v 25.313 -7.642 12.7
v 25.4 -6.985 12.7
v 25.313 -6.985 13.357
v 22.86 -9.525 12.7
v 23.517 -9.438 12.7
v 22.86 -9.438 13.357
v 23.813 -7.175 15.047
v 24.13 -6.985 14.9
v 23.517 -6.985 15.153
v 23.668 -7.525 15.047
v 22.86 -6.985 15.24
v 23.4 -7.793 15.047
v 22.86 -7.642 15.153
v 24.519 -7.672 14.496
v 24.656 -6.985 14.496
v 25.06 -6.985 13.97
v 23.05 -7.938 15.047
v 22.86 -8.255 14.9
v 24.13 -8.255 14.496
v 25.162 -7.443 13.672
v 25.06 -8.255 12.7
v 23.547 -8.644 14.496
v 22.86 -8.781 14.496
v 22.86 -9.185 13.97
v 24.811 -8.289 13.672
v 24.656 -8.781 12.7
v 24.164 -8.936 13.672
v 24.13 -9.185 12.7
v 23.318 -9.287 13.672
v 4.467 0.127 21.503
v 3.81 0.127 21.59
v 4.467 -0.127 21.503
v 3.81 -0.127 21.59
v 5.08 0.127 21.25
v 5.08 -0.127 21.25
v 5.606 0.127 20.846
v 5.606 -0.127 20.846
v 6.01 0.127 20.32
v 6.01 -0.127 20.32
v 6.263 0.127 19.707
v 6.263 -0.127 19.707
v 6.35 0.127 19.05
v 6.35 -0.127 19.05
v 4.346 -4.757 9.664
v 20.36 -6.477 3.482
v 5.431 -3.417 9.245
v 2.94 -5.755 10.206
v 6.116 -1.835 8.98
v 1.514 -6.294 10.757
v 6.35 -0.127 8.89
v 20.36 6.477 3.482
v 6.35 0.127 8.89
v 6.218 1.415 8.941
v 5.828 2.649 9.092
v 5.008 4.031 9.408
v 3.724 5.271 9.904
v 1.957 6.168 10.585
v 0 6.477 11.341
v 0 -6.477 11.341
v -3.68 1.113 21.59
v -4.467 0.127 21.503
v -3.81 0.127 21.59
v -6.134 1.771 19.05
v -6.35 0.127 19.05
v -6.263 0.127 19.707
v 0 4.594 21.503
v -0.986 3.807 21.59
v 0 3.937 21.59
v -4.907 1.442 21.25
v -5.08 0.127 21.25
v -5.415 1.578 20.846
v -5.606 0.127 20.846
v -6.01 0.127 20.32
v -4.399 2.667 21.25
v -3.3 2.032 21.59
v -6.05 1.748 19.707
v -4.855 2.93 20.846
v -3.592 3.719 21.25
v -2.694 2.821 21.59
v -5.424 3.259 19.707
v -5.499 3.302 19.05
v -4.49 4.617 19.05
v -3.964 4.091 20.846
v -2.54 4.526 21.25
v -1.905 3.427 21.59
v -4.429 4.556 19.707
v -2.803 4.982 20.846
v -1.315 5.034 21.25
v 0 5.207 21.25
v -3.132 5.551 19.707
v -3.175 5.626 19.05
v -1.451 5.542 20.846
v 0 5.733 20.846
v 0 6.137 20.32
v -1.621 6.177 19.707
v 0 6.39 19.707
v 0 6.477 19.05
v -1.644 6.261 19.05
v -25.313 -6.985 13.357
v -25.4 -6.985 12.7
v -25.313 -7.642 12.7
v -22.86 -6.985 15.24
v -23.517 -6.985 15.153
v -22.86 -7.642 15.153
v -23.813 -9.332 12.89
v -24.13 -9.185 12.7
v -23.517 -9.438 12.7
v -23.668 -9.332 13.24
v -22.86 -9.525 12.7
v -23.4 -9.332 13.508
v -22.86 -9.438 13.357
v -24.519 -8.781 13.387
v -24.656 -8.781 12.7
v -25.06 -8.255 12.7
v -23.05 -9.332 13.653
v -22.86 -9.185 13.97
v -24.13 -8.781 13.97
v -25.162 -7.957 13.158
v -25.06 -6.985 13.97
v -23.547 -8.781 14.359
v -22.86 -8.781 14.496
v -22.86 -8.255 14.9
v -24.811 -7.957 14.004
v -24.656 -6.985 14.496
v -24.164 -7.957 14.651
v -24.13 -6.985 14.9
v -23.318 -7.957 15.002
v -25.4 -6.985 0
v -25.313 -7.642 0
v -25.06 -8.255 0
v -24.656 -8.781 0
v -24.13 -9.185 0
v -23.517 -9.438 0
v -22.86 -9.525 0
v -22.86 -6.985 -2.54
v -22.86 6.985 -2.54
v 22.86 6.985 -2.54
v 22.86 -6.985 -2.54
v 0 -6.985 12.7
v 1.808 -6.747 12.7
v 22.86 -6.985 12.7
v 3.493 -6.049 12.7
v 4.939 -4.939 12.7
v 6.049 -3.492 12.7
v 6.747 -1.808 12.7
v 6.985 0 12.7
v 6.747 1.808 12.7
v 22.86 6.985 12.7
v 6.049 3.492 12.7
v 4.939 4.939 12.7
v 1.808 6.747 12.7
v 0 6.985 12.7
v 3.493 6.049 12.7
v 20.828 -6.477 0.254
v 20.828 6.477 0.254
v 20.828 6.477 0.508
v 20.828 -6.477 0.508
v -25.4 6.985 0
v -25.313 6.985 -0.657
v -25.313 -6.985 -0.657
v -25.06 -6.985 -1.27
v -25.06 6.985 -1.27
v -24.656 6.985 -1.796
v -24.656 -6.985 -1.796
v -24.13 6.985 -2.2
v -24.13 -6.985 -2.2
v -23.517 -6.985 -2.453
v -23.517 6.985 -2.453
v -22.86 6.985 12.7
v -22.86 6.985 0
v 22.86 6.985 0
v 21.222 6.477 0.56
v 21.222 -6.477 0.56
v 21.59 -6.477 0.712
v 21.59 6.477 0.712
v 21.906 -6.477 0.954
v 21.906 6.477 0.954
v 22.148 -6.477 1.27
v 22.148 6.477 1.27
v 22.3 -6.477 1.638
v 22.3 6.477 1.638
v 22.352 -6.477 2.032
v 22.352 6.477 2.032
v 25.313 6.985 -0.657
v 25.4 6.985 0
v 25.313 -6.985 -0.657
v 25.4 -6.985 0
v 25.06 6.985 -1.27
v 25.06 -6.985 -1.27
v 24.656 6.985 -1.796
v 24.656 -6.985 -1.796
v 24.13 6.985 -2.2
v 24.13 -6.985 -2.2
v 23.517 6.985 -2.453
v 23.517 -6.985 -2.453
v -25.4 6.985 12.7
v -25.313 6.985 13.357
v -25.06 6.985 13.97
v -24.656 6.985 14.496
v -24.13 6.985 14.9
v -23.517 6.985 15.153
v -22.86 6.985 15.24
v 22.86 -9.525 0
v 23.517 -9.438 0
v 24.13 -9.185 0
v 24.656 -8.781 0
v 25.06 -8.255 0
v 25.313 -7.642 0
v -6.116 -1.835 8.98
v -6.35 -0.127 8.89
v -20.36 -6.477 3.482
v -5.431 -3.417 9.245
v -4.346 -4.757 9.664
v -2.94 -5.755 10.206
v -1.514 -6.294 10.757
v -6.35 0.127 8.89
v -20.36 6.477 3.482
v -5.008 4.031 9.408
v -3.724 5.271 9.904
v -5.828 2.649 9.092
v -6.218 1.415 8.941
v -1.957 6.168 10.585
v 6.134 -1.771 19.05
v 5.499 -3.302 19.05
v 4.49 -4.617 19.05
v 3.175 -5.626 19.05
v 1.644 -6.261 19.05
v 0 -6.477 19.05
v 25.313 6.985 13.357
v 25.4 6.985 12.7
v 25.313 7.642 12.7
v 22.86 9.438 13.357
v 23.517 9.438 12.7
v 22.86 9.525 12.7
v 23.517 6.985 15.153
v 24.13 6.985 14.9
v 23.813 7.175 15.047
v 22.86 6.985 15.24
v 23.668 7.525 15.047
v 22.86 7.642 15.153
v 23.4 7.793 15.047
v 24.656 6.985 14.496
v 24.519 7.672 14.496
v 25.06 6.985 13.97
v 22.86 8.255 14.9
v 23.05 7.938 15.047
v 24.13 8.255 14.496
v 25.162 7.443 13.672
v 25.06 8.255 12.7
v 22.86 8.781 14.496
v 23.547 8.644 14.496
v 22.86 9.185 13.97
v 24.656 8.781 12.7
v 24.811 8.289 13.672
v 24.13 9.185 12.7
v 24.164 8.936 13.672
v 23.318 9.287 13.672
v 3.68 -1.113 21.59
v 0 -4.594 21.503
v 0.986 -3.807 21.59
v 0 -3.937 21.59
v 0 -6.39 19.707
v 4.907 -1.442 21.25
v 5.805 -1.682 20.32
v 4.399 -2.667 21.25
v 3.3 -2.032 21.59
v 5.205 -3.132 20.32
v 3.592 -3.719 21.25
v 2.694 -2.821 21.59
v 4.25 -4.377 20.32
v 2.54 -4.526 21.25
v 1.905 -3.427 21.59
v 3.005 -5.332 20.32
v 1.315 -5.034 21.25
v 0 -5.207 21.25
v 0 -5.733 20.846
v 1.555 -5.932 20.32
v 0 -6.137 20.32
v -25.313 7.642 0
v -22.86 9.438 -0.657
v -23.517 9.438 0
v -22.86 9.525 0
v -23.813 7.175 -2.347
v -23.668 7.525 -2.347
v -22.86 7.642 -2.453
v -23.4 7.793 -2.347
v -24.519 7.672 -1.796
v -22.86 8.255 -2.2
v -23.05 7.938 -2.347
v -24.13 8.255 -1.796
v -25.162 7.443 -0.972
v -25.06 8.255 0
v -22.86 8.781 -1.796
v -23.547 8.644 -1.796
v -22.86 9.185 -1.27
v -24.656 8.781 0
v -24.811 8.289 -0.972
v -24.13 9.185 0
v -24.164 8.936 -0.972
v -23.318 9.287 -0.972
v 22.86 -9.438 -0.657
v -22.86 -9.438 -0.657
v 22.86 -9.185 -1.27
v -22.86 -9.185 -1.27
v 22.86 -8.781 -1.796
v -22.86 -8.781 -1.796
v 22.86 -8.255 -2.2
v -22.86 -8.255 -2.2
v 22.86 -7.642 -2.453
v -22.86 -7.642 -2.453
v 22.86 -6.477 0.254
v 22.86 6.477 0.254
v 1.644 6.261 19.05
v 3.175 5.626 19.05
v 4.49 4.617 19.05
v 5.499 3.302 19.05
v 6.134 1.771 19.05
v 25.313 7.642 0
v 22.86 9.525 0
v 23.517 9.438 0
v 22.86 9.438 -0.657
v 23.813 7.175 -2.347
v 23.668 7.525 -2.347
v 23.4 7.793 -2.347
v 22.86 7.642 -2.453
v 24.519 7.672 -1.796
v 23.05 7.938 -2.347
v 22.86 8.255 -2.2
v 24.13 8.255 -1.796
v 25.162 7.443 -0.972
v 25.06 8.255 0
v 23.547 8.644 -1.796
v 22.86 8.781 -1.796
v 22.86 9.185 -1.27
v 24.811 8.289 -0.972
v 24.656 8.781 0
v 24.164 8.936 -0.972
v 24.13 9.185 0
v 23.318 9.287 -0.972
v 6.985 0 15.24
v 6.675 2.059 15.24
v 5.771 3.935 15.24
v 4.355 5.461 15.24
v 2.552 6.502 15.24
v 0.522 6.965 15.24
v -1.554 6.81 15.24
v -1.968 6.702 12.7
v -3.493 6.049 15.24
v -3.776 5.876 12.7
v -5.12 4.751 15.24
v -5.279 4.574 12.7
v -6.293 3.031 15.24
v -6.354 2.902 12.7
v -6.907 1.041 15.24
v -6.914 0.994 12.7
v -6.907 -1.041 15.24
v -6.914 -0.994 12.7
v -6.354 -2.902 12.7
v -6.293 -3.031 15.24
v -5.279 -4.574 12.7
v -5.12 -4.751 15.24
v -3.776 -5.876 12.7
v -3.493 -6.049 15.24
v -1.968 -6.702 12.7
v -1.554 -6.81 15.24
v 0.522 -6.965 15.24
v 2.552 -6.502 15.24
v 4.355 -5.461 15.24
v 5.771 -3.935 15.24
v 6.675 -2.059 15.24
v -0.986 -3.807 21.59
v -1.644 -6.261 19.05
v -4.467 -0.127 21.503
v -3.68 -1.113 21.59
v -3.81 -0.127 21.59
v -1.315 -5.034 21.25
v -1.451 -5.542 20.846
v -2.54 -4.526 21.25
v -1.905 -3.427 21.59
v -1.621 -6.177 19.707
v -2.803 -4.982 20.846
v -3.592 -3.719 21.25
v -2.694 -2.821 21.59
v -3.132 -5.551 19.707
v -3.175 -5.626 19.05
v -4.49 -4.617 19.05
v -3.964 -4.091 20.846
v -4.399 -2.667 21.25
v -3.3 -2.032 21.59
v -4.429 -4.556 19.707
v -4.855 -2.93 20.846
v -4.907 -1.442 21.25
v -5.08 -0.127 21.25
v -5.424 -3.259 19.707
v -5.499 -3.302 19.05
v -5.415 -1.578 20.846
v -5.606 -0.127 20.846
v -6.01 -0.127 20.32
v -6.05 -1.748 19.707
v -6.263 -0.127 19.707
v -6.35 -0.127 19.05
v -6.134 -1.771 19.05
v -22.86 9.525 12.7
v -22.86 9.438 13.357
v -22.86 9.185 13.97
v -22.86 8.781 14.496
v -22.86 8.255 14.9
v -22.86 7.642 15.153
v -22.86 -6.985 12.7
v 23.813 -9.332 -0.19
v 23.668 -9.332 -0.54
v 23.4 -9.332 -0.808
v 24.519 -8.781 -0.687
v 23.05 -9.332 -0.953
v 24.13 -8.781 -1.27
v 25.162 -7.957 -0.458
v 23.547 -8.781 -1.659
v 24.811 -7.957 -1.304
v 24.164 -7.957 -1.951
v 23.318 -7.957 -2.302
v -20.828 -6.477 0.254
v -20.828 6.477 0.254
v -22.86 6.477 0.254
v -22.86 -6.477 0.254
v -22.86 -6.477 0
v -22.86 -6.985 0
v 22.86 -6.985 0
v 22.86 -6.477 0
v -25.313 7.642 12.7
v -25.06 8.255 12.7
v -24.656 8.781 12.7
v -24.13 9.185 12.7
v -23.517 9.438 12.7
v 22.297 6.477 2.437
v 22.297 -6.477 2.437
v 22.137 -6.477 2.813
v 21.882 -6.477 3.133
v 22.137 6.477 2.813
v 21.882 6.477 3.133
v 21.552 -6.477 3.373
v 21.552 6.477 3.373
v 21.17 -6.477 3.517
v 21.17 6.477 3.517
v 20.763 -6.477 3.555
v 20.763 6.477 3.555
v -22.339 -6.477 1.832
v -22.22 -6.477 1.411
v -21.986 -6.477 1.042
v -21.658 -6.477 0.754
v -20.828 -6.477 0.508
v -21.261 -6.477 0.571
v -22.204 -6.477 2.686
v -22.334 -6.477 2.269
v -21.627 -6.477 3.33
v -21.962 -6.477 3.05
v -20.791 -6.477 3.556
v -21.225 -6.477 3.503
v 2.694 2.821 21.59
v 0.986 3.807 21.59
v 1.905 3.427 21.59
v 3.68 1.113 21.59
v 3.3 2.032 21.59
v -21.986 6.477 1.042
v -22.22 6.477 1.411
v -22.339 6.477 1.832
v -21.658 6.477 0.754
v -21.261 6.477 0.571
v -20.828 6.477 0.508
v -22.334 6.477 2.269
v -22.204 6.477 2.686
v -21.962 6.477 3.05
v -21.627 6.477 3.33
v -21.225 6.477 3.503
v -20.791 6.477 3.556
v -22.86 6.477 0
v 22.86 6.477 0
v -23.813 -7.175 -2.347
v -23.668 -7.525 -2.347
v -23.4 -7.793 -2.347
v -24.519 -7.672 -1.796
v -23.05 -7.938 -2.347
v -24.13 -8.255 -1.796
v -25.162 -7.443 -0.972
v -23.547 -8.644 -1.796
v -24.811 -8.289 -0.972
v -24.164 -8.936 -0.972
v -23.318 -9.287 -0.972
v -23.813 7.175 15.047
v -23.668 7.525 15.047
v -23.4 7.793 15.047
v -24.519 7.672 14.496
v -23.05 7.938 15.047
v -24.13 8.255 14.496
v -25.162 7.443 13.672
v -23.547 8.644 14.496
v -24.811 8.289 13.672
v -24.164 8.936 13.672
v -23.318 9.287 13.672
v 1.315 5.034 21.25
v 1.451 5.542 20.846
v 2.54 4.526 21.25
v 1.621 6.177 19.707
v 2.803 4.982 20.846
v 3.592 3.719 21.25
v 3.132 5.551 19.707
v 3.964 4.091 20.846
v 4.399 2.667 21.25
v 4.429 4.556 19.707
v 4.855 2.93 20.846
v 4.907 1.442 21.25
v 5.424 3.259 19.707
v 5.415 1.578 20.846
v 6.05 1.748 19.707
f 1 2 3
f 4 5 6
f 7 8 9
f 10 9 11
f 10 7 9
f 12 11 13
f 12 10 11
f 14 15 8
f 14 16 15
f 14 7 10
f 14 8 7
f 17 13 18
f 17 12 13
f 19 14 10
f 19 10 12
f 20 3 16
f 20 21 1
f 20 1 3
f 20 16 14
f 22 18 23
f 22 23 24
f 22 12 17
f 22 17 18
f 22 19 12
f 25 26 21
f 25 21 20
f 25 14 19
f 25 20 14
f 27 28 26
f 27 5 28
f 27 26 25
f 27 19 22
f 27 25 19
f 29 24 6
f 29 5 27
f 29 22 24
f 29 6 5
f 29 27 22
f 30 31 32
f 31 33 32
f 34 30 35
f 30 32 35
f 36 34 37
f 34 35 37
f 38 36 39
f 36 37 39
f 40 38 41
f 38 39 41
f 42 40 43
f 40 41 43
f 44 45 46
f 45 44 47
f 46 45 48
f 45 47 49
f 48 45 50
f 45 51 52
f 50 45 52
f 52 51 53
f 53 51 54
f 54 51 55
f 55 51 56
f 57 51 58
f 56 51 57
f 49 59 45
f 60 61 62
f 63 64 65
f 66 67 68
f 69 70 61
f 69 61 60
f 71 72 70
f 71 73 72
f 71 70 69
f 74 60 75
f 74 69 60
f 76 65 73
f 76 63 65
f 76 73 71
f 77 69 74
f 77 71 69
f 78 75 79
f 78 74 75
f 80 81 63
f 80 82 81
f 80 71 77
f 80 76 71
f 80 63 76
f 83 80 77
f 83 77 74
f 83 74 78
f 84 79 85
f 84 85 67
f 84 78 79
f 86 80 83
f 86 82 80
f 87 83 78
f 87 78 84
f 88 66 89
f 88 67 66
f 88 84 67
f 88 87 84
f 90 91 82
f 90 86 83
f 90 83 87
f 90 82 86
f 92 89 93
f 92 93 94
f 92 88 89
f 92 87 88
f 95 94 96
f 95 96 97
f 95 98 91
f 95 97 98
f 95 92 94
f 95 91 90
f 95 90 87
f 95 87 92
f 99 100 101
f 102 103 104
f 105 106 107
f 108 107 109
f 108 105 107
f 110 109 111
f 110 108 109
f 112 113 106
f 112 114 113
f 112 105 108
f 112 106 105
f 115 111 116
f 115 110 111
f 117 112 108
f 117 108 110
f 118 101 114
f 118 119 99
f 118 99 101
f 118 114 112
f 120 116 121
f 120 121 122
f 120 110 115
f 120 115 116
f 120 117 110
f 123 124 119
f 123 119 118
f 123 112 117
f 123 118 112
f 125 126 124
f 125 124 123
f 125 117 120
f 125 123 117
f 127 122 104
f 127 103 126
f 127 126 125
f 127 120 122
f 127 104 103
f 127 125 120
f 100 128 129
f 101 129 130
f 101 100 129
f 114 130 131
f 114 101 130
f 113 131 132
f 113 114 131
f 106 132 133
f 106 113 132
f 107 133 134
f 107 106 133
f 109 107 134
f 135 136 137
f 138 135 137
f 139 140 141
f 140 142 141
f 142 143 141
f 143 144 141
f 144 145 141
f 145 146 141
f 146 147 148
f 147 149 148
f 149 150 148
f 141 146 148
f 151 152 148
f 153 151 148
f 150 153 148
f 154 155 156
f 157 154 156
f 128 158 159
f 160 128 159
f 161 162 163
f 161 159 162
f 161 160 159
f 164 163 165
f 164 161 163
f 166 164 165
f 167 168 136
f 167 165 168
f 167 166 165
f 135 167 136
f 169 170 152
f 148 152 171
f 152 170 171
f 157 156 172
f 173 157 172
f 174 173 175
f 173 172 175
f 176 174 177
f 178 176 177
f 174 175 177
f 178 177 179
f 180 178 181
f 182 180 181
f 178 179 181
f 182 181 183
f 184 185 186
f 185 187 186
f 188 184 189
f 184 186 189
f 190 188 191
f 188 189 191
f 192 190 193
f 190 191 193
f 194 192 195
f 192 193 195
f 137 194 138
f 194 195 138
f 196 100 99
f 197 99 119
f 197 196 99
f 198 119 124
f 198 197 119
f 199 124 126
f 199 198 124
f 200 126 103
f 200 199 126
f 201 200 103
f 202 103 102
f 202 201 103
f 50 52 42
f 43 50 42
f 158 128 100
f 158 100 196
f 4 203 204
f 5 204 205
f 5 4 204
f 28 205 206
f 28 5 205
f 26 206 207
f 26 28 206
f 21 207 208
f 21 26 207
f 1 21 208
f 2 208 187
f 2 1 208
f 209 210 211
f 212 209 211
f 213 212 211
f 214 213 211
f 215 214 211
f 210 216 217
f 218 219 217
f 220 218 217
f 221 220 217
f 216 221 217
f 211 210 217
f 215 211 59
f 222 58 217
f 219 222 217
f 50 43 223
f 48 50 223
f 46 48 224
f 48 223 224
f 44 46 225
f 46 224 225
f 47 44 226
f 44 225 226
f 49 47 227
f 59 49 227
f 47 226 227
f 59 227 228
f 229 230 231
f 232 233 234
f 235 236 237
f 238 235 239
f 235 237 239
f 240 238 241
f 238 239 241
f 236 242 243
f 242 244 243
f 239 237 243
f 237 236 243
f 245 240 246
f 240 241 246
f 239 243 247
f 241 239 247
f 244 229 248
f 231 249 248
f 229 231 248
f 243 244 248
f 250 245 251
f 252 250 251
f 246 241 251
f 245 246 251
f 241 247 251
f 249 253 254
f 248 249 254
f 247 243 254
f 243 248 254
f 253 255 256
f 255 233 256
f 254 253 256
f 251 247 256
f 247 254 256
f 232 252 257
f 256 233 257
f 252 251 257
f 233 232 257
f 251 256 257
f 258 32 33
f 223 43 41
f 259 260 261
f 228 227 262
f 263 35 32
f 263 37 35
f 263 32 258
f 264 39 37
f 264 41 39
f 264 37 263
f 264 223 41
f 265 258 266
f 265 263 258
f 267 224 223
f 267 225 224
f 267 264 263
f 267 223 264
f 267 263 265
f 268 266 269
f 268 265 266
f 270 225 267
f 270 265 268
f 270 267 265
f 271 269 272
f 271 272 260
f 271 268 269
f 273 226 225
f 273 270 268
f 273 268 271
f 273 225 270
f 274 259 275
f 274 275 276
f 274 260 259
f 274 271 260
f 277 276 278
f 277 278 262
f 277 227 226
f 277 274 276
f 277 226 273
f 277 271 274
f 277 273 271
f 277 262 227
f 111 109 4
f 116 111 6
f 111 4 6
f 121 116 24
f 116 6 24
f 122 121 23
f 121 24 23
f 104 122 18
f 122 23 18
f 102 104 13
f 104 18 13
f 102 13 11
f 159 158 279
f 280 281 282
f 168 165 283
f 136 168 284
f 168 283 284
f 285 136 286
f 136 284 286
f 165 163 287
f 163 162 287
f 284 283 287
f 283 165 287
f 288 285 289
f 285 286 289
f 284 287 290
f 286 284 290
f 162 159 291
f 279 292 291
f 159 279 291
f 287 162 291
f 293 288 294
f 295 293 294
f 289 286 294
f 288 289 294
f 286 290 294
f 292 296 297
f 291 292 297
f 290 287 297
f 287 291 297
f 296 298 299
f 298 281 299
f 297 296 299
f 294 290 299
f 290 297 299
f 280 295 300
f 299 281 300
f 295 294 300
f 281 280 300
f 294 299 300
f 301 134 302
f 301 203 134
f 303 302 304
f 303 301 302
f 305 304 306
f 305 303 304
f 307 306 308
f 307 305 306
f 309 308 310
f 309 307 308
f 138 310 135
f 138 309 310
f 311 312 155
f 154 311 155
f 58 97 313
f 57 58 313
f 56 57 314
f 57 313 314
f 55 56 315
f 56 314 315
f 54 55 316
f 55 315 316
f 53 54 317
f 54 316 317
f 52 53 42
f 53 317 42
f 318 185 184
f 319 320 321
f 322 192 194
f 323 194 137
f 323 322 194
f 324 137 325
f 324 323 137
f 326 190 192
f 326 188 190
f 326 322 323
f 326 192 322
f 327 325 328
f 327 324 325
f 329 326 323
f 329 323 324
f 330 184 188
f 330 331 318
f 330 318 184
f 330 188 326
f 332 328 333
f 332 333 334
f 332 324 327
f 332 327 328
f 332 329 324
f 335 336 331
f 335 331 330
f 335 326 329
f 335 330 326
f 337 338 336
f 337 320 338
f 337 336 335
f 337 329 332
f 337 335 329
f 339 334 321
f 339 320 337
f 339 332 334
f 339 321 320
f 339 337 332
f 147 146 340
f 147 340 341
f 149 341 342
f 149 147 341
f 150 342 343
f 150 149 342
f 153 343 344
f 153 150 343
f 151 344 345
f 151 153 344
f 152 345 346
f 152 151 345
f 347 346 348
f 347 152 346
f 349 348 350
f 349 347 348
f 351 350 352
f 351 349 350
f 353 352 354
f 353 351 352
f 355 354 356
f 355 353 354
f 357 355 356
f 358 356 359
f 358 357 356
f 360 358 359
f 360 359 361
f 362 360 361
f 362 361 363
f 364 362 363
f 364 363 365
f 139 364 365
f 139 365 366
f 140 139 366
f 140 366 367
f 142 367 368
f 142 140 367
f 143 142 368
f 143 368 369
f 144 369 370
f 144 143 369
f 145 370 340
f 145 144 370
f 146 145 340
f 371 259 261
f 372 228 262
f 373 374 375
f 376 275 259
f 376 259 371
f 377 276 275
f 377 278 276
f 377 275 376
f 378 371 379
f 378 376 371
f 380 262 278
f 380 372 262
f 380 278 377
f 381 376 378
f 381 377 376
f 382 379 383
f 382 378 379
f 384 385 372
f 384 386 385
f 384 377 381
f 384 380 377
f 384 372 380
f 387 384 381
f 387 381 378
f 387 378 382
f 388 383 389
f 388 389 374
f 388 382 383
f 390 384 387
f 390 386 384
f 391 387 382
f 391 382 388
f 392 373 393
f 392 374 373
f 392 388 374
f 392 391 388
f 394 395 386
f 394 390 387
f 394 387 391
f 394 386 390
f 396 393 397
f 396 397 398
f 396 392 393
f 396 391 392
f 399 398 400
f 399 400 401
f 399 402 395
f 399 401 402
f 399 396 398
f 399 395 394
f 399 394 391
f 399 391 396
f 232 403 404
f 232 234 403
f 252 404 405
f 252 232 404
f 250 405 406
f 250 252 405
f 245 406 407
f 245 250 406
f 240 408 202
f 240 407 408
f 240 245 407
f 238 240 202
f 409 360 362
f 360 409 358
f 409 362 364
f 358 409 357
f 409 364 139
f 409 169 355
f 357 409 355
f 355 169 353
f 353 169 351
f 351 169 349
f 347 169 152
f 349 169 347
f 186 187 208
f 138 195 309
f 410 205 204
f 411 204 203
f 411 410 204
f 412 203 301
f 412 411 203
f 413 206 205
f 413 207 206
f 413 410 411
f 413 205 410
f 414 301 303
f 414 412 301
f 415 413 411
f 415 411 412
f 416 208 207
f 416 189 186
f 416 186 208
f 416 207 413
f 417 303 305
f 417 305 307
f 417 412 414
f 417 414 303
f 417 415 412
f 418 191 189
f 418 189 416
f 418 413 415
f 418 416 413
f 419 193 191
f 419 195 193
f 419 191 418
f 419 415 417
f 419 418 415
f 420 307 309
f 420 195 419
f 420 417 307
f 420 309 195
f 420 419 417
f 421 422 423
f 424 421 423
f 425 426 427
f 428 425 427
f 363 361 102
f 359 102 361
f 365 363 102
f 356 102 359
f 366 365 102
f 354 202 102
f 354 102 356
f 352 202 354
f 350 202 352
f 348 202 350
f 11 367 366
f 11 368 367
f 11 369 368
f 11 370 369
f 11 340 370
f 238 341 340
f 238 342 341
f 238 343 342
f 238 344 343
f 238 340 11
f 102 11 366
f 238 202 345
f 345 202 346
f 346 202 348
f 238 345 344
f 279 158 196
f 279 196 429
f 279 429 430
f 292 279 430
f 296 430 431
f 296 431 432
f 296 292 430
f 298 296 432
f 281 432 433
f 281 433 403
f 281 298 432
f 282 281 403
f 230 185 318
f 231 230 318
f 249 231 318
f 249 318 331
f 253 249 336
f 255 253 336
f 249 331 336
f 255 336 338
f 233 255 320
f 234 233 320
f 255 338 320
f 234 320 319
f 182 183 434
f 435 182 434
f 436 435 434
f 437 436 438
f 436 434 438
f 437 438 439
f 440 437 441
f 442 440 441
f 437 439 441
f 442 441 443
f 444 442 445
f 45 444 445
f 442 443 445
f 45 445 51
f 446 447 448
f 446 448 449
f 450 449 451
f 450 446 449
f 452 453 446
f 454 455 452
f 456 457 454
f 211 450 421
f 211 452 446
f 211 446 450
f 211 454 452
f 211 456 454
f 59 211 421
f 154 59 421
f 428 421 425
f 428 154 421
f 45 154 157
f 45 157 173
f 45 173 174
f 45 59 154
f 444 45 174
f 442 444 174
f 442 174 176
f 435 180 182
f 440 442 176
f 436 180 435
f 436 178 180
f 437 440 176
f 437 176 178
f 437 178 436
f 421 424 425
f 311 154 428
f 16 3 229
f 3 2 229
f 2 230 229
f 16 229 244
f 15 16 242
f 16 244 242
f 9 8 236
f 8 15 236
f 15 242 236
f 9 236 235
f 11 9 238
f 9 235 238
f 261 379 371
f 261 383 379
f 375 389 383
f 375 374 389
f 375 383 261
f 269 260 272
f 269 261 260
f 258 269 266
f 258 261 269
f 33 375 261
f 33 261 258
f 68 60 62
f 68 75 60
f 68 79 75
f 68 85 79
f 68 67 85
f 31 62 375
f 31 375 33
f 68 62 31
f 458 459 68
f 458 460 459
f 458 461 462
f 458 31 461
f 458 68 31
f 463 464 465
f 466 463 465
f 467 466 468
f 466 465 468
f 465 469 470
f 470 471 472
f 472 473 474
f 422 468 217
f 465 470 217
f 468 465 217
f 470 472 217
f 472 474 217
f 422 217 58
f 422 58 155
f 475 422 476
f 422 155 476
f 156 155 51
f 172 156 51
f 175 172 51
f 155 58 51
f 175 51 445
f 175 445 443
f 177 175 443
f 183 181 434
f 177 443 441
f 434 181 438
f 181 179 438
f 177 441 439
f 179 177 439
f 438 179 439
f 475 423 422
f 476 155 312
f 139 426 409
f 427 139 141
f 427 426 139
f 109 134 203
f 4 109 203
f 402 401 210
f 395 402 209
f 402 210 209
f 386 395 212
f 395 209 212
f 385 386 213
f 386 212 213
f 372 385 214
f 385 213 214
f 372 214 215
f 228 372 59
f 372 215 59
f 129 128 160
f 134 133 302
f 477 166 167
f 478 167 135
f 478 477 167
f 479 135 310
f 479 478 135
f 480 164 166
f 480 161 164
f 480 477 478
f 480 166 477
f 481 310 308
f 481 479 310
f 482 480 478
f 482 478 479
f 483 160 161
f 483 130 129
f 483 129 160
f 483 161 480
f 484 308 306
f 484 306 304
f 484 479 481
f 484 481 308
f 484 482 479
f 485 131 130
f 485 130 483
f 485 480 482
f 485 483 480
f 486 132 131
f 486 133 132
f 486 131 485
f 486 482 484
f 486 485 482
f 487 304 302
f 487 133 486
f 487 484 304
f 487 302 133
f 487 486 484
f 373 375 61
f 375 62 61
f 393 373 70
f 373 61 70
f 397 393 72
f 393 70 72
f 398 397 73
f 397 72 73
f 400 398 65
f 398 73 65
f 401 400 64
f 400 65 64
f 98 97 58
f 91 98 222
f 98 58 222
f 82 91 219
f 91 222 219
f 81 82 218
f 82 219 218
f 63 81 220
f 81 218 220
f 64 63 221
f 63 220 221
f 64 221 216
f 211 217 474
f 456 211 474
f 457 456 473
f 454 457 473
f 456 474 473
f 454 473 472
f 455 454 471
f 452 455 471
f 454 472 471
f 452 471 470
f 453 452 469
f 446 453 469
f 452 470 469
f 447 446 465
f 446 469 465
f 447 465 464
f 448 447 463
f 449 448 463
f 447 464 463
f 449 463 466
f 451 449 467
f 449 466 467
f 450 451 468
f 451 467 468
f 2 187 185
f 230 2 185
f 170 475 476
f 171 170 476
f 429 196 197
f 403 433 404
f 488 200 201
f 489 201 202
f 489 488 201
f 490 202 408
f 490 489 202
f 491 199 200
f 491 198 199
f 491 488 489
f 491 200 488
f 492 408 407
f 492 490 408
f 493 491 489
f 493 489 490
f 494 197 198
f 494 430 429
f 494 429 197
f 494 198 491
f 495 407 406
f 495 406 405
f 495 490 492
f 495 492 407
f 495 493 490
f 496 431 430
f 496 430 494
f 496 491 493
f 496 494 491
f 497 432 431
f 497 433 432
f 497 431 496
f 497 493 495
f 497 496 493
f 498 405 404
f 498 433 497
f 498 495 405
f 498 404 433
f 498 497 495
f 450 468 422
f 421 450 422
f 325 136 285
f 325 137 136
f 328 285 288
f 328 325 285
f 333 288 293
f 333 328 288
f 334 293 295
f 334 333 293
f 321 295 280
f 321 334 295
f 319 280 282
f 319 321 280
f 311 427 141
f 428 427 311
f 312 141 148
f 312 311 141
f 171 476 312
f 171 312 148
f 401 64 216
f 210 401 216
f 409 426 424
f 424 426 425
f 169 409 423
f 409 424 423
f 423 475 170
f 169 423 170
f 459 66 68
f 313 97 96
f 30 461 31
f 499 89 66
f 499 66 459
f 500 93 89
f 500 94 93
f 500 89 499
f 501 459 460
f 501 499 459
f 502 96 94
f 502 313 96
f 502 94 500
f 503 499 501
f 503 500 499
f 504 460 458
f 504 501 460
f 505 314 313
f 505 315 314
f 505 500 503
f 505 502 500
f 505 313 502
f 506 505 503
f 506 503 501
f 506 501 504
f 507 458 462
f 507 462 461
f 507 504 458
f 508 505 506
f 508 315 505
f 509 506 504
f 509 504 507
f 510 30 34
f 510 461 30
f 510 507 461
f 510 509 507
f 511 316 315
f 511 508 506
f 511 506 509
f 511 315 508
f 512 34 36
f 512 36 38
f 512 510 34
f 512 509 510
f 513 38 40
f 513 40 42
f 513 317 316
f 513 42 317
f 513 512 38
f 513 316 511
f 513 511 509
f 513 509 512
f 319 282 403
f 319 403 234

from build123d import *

# Parameters (mm, degrees)
F0_W     = 50.8
F0_H     = 19.05
F0_W_2   = 45.72
F0_H_2   = 13.97
F1_DEPTH = 12.7
F2_W     = 50.8
F2_H     = 19.05
F3_DEPTH = 2.54
F5_START = 0.508
F4_W     = 4.572
F4_H     = 2.794
F4_W_2   = 12.7
F4_H_2   = 5.08
F4_H_3   = 3.81
F5_DEPTH = 12.954
F6_R     = 6.34999
F7_W     = 50.8
F7_H     = 19.05
F7_R     = 6.985
F8_DEPTH = 2.54
F9_R     = 2.54
F10_R    = 2.54


# Not quite as in the source:
# - a fillet or chamfer is up to 0.001 mm smaller than in the source, because OpenCascade refuses the exact size


with BuildPart() as f1:
    # F0 (on Top) → F1 (new body)
    with BuildSketch(Plane.XY):
        Rectangle(F0_W, F0_H)
        Rectangle(F0_W_2, F0_H_2, mode=Mode.SUBTRACT)
    extrude(amount=F1_DEPTH)

    # F2 (on face) → F3 (join)
    with BuildSketch(Plane(origin=(0, 0, 0), x_dir=(1, 0, 0), z_dir=(0, 0, -1))):
        Rectangle(F2_W, F2_H)
    extrude(amount=F3_DEPTH)

    # F4 (on face) → F5 (join)
    with BuildSketch(Plane.XZ.offset(-6.985).offset(F5_START)):
        Polygon((-25.4, 0.254), (-25.4, -2.54), (20.828, -2.54), (20.828, 0.254), (-20.828, 0.254), align=None)
        with Locations((23.114, -1.143)):
            Rectangle(F4_W, F4_H)
        with BuildLine():
            Line((-20.828, 0.254), (20.828, 0.254))
            Line((20.828, 0.254), (20.828, 0.508))
            ThreePointArc((20.828, 0.508), (19.7166563034, 0.9891715443), (19.3070802744, 2.1288462099))
            Line((19.3070802744, 2.1288462099), (5.08, 7.62))
            Line((5.08, 7.62), (-5.08, 7.62))
            Line((-5.08, 7.62), (-19.3070802744, 2.1288462099))
            ThreePointArc((-19.3070802744, 2.1288462099), (-19.3047702633, 2.0804475914), (-19.304, 2.032))
            ThreePointArc((-19.304, 2.032), (-19.7503692655, 0.9543692655), (-20.828, 0.508))
            Line((-20.828, 0.508), (-20.828, 0.254))
        make_face()
        with BuildLine():
            ThreePointArc((19.3070802744, 2.1288462099), (19.7166563034, 0.9891715443), (20.828, 0.508))
            Line((20.828, 0.508), (20.828, 2.032))
            Line((20.828, 2.032), (19.558, 2.032))
            Line((19.558, 2.032), (19.3070802744, 2.1288462099))
        make_face()
        with BuildLine():
            Line((20.828, 2.032), (20.828, 0.508))
            ThreePointArc((20.828, 0.508), (21.9056307345, 0.9543692655), (22.352, 2.032))
            ThreePointArc((22.352, 2.032), (21.7251962822, 3.2639151071), (20.3603794867, 3.4824851104))
            Line((20.3603794867, 3.4824851104), (20.828, 3.302))
            Line((20.828, 3.302), (20.828, 2.032))
        make_face()
        with BuildLine():
            ThreePointArc((-20.3603794867, 3.4824851104), (-22.3335091013, 2.2686819509), (-20.828, 0.508))
            Line((-20.828, 0.508), (-20.828, 2.032))
            Line((-20.828, 2.032), (-20.828, 3.302))
            Line((-20.828, 3.302), (-20.3603794867, 3.4824851104))
        make_face()
        with BuildLine():
            Line((-20.828, 2.032), (-20.828, 0.508))
            ThreePointArc((-20.828, 0.508), (-19.7503692655, 0.9543692655), (-19.304, 2.032))
            ThreePointArc((-19.304, 2.032), (-19.3047702633, 2.0804475914), (-19.3070802744, 2.1288462099))
            Line((-19.3070802744, 2.1288462099), (-19.558, 2.032))
            Line((-19.558, 2.032), (-20.828, 2.032))
        make_face()
        with BuildLine():
            Line((19.558, 2.032), (20.828, 2.032))
            Line((20.828, 2.032), (20.828, 3.302))
            Line((20.828, 3.302), (20.3603794867, 3.4824851104))
            ThreePointArc((20.3603794867, 3.4824851104), (19.6252291828, 2.9679051027), (19.3070802744, 2.1288462099))
            Line((19.3070802744, 2.1288462099), (19.558, 2.032))
        make_face()
        with BuildLine():
            Line((5.08, 7.62), (19.3070802744, 2.1288462099))
            ThreePointArc((19.3070802744, 2.1288462099), (19.6252291828, 2.9679051027), (20.3603794867, 3.4824851104))
            Line((20.3603794867, 3.4824851104), (6.35, 8.89))
            Line((6.35, 8.89), (6.35, 7.62))
            Line((6.35, 7.62), (5.08, 7.62))
        make_face()
        with BuildLine():
            Line((-20.828, 3.302), (-20.828, 2.032))
            Line((-20.828, 2.032), (-19.558, 2.032))
            Line((-19.558, 2.032), (-19.3070802744, 2.1288462099))
            ThreePointArc((-19.3070802744, 2.1288462099), (-19.6252291828, 2.9679051027), (-20.3603794867, 3.4824851104))
            Line((-20.3603794867, 3.4824851104), (-20.828, 3.302))
        make_face()
        with BuildLine():
            Line((-6.35, 8.89), (-20.3603794867, 3.4824851104))
            ThreePointArc((-20.3603794867, 3.4824851104), (-19.6252291828, 2.9679051027), (-19.3070802744, 2.1288462099))
            Line((-19.3070802744, 2.1288462099), (-5.08, 7.62))
            Line((-5.08, 7.62), (-6.35, 7.62))
            Line((-6.35, 7.62), (-6.35, 8.89))
        make_face()
        Polygon((-5.08, 7.62), (5.08, 7.62), (6.35, 7.62), (6.35, 8.89), (6.35, 12.7), (-6.35, 12.7), (-6.35, 8.89), (-6.35, 7.62), align=None)
        with Locations((0, 15.24)):
            Rectangle(F4_W_2, F4_H_2)
        with Locations((0, 19.685)):
            Rectangle(F4_W_2, F4_H_3)
    extrude(amount=F5_DEPTH)

    # F6 (radius 6.35 in the source; OpenCascade refuses exactly that, so slightly less here)
    f6_edges = [f1.edges().sort_by_distance(p)[0] for p in [
        (-6.35, -6.477, 15.24),
        (6.35, -6.477, 15.24),
        (6.35, 6.477, 15.24),
        (-6.35, 6.477, 15.24),
    ]]
    fillet(f6_edges, radius=F6_R)

    # F7 (on face) → F8 (join)
    with BuildSketch(Plane.XY.offset(12.7)):
        Rectangle(F7_W, F7_H)
        Circle(F7_R, mode=Mode.SUBTRACT)
    extrude(amount=F8_DEPTH)

    # F9
    f9_edges = [f1.edges().sort_by_distance(p)[0] for p in [
        (-25.4, 9.525, 6.35),
        (-25.4, 0, 15.24),
        (-25.4, -9.525, 6.35),
        (-25.4, 0, -2.54),
        (25.4, 9.525, 6.35),
        (25.4, 0, -2.54),
        (25.4, -9.525, 6.35),
        (25.4, 0, 15.24),
        (0, -9.525, 15.24),
        (0, -9.525, -2.54),
        (0, 9.525, -2.54),
        (0, 9.525, 15.24),
    ]]
    fillet(f9_edges, radius=F9_R)

    # F10
    f10_edges = [f1.edges().sort_by_distance(p)[0] for p in [
        (4.490131, -4.617131, 21.59),
    ]]
    fillet(f10_edges, radius=F10_R)


solid = f1.part
